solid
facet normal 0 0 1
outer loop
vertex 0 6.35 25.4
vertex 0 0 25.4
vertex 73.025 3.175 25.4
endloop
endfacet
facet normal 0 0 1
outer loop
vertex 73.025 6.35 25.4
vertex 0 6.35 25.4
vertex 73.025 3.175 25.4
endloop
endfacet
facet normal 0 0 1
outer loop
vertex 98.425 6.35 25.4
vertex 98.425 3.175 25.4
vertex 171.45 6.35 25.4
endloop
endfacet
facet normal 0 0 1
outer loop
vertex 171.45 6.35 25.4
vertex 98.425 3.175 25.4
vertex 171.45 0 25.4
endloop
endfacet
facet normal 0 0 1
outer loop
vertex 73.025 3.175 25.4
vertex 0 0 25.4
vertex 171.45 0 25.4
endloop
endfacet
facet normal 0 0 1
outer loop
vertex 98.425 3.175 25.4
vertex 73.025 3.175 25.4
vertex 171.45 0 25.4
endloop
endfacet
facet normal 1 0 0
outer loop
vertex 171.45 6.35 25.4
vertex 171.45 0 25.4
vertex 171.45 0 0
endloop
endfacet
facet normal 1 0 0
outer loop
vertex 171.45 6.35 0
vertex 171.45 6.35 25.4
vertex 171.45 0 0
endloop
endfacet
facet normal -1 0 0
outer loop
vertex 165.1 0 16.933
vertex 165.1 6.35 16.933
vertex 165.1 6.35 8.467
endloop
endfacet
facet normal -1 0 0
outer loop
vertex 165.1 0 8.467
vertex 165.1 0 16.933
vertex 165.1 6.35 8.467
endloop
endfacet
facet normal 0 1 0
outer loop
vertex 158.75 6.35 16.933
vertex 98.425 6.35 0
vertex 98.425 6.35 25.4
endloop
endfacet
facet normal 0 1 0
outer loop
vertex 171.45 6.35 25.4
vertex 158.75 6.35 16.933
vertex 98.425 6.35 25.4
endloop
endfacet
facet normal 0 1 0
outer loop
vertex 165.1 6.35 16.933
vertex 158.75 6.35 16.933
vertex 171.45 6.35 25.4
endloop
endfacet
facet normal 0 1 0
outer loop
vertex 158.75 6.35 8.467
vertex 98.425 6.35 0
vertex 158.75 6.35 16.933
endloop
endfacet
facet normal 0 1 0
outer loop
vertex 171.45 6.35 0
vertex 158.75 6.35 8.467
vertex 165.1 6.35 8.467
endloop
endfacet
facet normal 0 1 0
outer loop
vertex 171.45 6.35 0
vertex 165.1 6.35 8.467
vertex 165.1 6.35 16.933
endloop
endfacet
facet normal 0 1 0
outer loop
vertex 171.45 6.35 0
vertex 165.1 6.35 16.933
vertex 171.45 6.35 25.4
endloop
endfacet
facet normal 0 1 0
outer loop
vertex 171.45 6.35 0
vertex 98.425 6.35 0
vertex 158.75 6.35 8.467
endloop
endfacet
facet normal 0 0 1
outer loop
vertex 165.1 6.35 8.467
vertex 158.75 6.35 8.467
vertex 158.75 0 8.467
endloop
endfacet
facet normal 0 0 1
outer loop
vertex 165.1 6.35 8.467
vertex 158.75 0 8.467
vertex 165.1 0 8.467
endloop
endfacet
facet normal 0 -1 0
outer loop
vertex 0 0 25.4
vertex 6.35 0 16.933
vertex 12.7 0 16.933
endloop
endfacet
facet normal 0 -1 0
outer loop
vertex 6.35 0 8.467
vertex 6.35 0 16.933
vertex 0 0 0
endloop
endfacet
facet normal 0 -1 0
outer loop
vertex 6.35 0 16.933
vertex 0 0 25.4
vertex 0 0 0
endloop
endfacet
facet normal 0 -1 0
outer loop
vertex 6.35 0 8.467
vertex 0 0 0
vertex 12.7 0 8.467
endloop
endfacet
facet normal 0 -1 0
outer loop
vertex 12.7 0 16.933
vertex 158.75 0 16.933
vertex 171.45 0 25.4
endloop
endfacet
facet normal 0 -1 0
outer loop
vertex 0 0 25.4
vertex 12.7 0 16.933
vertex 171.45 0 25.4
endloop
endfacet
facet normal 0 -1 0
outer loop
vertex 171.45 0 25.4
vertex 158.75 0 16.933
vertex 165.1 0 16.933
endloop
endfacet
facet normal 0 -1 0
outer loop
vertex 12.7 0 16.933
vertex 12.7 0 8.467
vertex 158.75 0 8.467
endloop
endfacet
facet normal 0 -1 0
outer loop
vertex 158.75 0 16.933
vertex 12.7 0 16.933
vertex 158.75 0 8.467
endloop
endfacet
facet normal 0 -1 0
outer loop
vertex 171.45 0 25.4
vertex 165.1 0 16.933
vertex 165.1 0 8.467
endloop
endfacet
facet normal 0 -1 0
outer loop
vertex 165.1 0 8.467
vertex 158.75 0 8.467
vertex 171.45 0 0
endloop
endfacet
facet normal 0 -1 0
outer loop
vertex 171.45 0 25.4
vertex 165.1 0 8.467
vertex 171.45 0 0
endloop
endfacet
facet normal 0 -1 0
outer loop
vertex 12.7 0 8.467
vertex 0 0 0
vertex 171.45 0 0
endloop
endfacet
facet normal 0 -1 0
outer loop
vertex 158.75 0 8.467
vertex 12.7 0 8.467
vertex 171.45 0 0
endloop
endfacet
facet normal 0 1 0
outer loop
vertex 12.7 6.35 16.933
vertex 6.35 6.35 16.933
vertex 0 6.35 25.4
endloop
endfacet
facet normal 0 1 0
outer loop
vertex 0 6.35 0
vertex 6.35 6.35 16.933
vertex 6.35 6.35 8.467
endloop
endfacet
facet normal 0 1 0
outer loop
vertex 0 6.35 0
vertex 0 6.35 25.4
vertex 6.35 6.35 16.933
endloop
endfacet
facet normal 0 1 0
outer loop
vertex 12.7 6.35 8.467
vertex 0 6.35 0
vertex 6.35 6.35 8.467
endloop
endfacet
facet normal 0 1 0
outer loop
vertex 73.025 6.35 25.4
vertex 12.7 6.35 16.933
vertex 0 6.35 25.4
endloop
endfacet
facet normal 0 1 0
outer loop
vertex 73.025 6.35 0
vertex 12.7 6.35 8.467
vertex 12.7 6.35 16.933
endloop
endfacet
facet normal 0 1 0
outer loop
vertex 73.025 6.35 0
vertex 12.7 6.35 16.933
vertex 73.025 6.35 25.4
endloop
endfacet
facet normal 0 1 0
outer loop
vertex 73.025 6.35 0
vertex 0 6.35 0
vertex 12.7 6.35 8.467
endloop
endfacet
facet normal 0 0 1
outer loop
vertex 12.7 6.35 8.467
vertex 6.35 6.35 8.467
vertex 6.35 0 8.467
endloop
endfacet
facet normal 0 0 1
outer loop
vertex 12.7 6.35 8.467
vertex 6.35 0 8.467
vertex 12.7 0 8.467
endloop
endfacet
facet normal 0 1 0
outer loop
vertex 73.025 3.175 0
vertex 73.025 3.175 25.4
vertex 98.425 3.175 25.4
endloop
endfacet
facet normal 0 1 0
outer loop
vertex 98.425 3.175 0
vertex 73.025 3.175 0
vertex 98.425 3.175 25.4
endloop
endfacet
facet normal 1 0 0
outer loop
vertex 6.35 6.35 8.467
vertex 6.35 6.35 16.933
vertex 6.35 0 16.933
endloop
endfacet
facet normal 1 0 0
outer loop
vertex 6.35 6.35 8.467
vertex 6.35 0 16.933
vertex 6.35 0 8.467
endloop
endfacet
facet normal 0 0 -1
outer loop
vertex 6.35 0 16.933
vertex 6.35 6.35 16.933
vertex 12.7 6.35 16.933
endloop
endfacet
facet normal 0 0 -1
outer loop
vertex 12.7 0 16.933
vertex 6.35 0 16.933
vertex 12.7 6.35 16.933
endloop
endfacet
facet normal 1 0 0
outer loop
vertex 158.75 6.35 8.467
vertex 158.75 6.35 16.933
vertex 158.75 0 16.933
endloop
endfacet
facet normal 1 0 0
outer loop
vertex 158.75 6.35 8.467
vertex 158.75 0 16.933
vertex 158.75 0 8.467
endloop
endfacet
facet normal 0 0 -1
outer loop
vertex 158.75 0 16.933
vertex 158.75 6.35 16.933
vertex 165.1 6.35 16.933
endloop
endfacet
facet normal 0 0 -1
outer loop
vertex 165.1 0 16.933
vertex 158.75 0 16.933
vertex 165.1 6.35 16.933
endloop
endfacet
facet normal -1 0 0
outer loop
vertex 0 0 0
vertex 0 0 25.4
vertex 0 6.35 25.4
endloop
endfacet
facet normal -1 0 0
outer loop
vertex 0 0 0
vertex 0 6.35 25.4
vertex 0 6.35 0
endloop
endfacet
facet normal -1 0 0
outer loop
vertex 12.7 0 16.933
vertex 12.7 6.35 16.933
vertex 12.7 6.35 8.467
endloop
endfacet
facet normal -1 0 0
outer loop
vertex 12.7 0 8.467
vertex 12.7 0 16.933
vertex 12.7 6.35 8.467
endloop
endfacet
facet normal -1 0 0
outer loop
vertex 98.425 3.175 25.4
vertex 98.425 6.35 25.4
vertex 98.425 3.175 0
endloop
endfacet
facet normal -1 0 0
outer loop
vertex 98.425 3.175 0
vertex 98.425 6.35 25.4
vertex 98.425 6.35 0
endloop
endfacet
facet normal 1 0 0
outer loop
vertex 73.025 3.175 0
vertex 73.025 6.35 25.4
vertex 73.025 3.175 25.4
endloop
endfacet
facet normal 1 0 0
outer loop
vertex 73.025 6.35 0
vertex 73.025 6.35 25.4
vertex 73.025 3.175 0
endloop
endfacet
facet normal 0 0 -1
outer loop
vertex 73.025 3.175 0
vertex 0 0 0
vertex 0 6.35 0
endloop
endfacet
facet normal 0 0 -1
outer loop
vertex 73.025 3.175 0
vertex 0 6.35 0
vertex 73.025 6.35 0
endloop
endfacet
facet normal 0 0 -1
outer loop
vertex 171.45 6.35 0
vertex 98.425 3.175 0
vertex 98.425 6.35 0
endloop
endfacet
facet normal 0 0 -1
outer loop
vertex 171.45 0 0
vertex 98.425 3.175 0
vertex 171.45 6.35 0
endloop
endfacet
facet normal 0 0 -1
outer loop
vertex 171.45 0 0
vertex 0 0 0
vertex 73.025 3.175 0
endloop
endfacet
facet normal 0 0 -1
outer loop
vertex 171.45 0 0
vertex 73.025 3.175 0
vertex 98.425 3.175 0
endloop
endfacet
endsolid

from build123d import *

# Parameters (mm, degrees)
SKETCH2_W           = 171.45
SKETCH2_H           = 25.4
BOSS_EXTRUDE1_DEPTH = 6.35
SKETCH3_W           = 6.35
SKETCH3_H           = 8.466666666
CUT_EXTRUDE1_DEPTH  = 174.437553604
SKETCH4_W           = 25.4
SKETCH4_H           = 25.4
CUT_EXTRUDE2_DEPTH  = 3.175


with BuildPart() as part:
    # Sketch2 → Boss-Extrude1 (new body)
    with BuildSketch(Plane(origin=(0, 0, 0), x_dir=(1, 0, 0), z_dir=(0, 1, 0))):
        with Locations((85.725, -12.7)):
            Rectangle(SKETCH2_W, SKETCH2_H)
    extrude(amount=BOSS_EXTRUDE1_DEPTH)

    # Sketch3 → Cut-Extrude1 (cut, through all)
    with BuildSketch(Plane(origin=(0, 6.35, 0), x_dir=(1, 0, 0), z_dir=(0, 1, 0))):
        with Locations((161.925, -12.7)):
            Rectangle(SKETCH3_W, SKETCH3_H)
        with Locations((9.525, -12.7)):
            Rectangle(SKETCH3_W, SKETCH3_H)
    extrude(amount=-CUT_EXTRUDE1_DEPTH, mode=Mode.SUBTRACT)

    # Sketch4 → Cut-Extrude2 (cut)
    with BuildSketch(Plane(origin=(0, 6.35, 0), x_dir=(1, 0, 0), z_dir=(0, 1, 0))):
        with Locations((85.725, -12.7)):
            Rectangle(SKETCH4_W, SKETCH4_H)
    extrude(amount=-CUT_EXTRUDE2_DEPTH, mode=Mode.SUBTRACT)


solid = part.part
